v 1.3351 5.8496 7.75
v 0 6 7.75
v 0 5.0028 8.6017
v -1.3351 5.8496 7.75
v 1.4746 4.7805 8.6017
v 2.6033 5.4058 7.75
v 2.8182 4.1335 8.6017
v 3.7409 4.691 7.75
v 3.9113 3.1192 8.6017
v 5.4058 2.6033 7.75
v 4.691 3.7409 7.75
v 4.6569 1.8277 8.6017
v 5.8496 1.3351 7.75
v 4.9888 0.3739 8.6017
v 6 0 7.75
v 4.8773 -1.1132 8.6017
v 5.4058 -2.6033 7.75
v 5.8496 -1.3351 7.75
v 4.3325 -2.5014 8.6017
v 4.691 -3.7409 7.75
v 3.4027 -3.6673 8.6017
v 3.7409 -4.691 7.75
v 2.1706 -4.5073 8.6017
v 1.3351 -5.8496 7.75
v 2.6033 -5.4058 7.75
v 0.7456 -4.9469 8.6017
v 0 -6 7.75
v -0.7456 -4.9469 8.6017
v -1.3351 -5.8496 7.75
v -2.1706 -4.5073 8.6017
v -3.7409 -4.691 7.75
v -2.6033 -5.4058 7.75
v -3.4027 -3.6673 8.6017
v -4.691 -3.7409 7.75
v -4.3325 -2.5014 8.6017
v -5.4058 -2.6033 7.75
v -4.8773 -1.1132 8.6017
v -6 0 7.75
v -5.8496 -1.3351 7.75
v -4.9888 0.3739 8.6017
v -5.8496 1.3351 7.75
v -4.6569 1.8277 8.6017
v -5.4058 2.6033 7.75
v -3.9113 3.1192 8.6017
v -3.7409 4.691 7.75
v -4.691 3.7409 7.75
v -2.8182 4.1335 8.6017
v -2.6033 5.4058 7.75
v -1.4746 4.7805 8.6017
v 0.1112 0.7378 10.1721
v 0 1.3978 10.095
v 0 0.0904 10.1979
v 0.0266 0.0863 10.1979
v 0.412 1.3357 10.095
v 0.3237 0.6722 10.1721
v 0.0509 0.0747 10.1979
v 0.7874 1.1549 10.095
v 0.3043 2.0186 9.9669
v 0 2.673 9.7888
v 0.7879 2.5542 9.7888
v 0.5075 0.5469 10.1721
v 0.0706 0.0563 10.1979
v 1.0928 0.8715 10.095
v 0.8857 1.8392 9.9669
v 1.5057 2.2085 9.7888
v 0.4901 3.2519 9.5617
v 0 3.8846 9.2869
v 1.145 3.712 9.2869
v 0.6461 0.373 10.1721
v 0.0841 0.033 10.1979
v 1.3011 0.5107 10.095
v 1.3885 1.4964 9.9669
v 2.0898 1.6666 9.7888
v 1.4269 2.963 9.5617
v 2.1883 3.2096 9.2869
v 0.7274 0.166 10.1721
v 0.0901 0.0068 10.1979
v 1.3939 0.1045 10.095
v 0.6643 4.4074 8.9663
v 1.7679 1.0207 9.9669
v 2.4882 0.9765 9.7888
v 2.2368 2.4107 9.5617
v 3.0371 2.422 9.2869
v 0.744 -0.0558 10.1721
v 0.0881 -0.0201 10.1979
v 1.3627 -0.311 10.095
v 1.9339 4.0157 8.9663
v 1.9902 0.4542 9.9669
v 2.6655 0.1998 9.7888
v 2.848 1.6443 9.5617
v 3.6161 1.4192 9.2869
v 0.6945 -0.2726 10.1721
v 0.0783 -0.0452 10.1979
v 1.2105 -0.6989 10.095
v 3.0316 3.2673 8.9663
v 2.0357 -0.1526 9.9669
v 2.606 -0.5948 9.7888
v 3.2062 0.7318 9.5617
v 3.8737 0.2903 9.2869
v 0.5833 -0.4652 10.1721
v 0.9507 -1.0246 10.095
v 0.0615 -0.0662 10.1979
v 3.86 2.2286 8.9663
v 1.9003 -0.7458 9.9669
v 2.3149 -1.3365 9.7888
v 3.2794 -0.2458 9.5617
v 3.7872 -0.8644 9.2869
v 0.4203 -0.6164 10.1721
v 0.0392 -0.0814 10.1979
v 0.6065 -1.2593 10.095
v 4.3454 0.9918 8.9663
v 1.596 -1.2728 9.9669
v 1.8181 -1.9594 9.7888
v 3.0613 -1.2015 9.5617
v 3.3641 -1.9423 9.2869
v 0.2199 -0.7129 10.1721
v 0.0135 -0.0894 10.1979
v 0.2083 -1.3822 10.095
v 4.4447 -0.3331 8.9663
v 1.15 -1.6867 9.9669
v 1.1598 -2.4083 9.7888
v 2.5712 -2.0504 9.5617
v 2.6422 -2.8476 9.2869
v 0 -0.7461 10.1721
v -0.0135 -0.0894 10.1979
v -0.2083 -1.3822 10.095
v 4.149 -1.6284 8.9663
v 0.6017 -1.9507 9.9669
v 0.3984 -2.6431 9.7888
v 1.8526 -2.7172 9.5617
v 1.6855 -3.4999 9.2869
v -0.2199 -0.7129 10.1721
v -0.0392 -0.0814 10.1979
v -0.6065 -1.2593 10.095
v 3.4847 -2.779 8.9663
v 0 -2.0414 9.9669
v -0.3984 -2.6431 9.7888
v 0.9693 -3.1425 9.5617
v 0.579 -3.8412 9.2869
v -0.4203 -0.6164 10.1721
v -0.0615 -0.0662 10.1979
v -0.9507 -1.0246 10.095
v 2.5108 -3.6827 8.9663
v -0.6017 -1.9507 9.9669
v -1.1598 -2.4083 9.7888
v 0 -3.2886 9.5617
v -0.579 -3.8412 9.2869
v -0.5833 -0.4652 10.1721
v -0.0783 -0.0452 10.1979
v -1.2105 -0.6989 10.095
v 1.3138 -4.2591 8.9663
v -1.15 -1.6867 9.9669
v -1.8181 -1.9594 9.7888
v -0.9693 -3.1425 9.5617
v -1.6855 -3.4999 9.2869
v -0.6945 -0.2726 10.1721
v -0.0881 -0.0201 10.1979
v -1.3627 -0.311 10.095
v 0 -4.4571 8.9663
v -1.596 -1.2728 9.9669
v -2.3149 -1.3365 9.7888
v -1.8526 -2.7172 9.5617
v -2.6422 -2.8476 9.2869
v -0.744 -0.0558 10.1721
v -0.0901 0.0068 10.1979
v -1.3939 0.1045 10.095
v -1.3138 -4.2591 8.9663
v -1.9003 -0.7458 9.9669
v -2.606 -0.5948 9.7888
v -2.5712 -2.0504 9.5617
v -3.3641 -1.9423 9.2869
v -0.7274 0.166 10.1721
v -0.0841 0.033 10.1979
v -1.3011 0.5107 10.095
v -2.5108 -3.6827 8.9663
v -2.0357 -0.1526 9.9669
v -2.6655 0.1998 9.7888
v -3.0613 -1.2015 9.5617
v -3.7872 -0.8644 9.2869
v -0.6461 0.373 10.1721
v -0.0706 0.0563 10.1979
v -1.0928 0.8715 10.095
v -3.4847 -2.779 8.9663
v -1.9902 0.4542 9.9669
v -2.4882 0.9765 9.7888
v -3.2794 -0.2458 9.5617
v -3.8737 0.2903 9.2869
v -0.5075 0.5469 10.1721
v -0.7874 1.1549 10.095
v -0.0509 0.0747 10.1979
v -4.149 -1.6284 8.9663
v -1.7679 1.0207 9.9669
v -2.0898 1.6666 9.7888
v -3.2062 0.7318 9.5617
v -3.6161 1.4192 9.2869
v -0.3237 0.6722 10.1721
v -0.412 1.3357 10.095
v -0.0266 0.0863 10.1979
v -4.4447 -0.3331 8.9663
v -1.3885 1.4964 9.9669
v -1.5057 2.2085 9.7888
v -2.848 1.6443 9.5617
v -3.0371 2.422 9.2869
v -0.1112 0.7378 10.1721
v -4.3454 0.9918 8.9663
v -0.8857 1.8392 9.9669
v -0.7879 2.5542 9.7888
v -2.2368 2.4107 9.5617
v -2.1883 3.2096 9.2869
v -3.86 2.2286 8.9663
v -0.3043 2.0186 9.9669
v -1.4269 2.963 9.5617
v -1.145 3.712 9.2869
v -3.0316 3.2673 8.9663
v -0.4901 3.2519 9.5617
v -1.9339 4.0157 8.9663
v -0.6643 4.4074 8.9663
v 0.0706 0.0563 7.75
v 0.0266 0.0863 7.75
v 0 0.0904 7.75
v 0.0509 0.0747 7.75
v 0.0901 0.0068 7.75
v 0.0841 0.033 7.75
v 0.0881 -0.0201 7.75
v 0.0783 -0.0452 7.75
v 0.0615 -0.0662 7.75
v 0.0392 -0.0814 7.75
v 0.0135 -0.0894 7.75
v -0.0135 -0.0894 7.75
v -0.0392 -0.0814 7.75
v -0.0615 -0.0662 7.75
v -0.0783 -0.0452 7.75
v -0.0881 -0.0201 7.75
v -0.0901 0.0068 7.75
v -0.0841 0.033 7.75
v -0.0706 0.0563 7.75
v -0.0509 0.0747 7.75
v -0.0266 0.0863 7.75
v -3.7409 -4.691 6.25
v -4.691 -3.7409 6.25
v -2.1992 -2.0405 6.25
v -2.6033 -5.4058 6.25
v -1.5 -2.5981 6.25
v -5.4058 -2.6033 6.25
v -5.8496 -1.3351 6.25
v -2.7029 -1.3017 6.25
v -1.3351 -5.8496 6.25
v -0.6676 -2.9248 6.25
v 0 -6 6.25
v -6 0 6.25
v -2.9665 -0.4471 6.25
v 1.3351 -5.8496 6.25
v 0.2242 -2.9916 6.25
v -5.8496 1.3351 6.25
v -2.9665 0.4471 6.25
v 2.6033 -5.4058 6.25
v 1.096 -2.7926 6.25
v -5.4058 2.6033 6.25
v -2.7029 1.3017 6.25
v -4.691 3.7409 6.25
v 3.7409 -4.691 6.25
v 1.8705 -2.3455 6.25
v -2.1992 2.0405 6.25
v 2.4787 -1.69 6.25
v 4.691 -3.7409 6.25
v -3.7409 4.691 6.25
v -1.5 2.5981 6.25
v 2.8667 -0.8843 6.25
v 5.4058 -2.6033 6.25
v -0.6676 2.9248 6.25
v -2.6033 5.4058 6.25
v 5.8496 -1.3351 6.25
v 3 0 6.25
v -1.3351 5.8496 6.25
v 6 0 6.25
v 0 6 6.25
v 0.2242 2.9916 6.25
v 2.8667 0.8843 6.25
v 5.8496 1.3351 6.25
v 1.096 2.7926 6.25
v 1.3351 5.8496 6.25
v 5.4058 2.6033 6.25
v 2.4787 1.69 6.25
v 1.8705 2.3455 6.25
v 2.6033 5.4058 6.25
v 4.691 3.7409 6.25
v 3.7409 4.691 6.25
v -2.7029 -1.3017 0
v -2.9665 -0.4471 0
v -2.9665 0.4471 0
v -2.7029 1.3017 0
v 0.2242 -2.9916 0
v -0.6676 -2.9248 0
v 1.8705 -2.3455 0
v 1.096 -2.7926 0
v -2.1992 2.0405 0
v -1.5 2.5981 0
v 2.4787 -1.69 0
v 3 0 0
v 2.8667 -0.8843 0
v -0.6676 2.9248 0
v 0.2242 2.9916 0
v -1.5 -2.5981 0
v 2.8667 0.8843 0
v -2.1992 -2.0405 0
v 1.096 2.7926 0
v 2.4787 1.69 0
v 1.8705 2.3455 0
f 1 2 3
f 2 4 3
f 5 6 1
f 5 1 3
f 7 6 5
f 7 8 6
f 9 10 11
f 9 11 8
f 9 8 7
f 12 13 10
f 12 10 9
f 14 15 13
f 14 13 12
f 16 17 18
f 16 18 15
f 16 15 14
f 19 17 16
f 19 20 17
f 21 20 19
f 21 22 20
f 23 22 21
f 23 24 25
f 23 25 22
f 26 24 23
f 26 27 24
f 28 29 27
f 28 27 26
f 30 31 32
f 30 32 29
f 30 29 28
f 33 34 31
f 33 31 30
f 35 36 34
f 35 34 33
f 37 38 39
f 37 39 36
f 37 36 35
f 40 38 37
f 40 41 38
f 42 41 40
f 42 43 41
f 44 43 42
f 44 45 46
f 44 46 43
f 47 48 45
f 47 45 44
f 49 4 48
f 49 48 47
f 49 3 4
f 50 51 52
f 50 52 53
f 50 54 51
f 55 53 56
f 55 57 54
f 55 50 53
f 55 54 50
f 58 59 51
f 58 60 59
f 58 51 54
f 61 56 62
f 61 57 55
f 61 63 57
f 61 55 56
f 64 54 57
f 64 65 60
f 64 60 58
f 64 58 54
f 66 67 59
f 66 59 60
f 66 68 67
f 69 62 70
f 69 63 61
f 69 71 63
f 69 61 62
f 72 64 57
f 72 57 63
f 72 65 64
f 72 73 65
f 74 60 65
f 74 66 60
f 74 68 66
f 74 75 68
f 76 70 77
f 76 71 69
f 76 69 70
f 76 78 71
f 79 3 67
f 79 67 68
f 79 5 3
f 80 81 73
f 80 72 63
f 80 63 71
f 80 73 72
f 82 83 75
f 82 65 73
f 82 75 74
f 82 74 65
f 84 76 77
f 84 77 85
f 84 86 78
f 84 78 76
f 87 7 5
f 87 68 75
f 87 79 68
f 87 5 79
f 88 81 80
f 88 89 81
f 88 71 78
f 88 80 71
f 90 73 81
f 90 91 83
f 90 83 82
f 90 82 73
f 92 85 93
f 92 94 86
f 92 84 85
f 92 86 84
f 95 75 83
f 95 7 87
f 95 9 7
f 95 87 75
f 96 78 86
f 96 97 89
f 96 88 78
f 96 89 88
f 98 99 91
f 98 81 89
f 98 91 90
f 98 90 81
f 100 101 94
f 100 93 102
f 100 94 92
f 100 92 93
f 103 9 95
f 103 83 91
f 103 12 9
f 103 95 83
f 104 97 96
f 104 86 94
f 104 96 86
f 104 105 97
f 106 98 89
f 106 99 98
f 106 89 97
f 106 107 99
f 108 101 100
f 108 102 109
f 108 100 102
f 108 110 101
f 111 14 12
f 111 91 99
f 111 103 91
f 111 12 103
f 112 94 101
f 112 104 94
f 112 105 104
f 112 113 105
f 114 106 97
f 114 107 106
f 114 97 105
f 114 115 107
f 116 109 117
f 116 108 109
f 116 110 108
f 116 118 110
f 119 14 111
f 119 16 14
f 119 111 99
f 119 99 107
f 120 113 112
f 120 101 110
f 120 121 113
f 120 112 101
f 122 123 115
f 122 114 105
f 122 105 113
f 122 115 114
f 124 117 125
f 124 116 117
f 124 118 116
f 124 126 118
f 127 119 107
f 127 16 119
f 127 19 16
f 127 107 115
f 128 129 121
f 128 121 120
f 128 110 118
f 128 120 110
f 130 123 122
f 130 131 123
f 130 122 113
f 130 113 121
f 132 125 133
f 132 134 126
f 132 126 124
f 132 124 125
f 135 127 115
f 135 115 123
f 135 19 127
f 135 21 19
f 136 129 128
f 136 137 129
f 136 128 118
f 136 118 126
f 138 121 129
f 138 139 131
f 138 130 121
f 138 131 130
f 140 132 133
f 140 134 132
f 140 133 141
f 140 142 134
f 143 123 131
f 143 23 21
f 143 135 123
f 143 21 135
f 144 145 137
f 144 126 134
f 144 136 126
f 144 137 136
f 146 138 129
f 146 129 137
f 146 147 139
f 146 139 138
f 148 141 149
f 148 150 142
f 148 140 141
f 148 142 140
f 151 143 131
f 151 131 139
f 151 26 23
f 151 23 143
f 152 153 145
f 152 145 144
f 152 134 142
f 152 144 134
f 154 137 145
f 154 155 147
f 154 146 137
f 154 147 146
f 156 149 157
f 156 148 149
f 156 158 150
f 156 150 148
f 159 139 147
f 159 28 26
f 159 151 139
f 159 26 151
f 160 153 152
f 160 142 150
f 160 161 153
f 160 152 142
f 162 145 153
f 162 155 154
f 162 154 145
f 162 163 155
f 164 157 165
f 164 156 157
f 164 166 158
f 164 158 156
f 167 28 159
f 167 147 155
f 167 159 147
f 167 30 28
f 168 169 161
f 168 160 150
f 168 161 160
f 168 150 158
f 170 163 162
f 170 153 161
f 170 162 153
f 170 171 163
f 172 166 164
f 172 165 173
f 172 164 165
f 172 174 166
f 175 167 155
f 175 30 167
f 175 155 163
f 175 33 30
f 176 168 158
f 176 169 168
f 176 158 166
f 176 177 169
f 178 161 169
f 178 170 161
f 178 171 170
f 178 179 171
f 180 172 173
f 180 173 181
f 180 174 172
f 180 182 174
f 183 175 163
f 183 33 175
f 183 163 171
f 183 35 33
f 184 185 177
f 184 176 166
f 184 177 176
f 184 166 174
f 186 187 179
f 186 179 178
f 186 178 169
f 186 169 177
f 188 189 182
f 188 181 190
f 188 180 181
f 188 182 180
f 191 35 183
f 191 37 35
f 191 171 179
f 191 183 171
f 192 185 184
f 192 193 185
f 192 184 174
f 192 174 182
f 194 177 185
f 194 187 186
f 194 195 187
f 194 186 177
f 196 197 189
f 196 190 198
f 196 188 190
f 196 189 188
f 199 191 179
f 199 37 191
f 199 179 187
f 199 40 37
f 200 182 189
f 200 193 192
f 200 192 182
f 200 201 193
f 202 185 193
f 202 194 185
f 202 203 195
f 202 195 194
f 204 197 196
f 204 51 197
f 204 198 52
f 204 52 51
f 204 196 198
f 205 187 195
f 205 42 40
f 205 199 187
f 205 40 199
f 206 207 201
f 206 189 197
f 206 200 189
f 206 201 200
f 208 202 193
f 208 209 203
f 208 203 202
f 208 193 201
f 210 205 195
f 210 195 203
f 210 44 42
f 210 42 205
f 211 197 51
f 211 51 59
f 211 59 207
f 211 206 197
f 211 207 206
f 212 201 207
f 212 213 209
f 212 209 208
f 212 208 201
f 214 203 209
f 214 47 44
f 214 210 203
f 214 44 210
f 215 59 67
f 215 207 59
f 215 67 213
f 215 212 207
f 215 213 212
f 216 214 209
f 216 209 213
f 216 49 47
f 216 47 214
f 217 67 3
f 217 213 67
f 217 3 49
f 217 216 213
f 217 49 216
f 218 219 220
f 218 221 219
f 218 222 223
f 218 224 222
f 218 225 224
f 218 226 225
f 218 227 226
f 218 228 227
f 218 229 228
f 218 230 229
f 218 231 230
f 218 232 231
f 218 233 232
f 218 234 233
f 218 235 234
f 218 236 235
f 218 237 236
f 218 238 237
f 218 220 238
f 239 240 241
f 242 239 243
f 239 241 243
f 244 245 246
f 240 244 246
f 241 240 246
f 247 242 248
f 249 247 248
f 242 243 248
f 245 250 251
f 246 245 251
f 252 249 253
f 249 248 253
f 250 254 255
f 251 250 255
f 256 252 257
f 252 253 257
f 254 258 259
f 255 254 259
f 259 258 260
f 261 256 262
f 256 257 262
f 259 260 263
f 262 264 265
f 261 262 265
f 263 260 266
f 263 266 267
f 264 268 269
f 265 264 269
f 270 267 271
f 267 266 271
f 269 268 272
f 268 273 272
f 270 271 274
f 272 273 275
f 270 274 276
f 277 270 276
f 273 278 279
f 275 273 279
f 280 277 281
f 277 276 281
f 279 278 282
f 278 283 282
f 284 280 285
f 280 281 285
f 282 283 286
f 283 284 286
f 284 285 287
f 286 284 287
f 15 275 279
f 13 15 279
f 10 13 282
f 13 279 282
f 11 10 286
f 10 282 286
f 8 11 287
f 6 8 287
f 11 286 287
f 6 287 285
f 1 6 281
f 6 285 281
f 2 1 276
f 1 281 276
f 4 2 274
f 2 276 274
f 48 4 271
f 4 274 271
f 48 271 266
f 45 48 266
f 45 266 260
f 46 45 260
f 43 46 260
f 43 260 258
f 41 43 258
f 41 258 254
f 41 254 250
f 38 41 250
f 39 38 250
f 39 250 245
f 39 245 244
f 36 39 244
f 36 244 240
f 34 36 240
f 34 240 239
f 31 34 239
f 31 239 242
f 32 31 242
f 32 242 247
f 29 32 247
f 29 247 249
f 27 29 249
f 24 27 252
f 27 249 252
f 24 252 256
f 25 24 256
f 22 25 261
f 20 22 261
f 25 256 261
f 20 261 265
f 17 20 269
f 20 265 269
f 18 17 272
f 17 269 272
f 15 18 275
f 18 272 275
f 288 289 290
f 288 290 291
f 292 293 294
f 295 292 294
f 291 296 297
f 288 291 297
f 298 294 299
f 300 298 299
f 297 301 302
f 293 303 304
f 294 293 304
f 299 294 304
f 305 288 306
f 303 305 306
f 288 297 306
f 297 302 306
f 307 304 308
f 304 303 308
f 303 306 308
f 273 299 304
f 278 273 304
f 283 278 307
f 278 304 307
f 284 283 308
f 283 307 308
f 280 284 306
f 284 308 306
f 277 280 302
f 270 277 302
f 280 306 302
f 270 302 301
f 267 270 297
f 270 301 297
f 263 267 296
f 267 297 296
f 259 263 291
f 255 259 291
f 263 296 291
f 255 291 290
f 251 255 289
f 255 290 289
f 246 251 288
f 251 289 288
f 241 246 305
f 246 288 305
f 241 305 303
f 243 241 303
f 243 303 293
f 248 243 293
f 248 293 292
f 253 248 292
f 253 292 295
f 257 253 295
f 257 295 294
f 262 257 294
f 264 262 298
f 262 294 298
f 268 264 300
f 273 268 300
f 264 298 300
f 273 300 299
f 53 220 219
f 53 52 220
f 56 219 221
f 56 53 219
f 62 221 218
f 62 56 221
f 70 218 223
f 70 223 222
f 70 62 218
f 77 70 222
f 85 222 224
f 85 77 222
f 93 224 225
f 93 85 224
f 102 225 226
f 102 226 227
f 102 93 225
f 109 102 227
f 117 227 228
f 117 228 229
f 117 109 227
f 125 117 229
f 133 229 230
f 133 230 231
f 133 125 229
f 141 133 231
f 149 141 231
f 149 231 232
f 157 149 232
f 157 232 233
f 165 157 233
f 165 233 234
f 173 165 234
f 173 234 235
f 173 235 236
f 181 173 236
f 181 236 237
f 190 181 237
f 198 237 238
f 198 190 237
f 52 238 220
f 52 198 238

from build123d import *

# Parameters (mm, degrees)
SKETCH1_R           = 3
BOSS_EXTRUDE1_DEPTH = 6.25
SKETCH2_R           = 6
BOSS_EXTRUDE2_DEPTH = 1.5


with BuildPart() as part:
    # Sketch1 → Boss-Extrude1 (new body)
    with BuildSketch(Plane.XY):
        Circle(SKETCH1_R)
    extrude(amount=BOSS_EXTRUDE1_DEPTH)

    # Sketch2 → Boss-Extrude2 (add)
    with BuildSketch(Plane.XY.offset(6.25)):
        Circle(SKETCH2_R)
    extrude(amount=BOSS_EXTRUDE2_DEPTH)

    # Sketch3 → Revolve1 (revolve)
    with BuildSketch(Plane(origin=(0, 0, 0), x_dir=(0, 0, -1), z_dir=(1, 0, 0))):
        with BuildLine():
            Line((-7.75, 6), (-7.75, 0.09036269))
            Line((-7.75, 0.09036269), (-10.197851923, 0.09036269))
            ThreePointArc((-10.197851923, 0.09036269), (-9.561675935, 3.288635355), (-7.75, 6))
        make_face()
    revolve(axis=Axis((0, 0, 6.25), (0, 0, -1)))


solid = part.part
